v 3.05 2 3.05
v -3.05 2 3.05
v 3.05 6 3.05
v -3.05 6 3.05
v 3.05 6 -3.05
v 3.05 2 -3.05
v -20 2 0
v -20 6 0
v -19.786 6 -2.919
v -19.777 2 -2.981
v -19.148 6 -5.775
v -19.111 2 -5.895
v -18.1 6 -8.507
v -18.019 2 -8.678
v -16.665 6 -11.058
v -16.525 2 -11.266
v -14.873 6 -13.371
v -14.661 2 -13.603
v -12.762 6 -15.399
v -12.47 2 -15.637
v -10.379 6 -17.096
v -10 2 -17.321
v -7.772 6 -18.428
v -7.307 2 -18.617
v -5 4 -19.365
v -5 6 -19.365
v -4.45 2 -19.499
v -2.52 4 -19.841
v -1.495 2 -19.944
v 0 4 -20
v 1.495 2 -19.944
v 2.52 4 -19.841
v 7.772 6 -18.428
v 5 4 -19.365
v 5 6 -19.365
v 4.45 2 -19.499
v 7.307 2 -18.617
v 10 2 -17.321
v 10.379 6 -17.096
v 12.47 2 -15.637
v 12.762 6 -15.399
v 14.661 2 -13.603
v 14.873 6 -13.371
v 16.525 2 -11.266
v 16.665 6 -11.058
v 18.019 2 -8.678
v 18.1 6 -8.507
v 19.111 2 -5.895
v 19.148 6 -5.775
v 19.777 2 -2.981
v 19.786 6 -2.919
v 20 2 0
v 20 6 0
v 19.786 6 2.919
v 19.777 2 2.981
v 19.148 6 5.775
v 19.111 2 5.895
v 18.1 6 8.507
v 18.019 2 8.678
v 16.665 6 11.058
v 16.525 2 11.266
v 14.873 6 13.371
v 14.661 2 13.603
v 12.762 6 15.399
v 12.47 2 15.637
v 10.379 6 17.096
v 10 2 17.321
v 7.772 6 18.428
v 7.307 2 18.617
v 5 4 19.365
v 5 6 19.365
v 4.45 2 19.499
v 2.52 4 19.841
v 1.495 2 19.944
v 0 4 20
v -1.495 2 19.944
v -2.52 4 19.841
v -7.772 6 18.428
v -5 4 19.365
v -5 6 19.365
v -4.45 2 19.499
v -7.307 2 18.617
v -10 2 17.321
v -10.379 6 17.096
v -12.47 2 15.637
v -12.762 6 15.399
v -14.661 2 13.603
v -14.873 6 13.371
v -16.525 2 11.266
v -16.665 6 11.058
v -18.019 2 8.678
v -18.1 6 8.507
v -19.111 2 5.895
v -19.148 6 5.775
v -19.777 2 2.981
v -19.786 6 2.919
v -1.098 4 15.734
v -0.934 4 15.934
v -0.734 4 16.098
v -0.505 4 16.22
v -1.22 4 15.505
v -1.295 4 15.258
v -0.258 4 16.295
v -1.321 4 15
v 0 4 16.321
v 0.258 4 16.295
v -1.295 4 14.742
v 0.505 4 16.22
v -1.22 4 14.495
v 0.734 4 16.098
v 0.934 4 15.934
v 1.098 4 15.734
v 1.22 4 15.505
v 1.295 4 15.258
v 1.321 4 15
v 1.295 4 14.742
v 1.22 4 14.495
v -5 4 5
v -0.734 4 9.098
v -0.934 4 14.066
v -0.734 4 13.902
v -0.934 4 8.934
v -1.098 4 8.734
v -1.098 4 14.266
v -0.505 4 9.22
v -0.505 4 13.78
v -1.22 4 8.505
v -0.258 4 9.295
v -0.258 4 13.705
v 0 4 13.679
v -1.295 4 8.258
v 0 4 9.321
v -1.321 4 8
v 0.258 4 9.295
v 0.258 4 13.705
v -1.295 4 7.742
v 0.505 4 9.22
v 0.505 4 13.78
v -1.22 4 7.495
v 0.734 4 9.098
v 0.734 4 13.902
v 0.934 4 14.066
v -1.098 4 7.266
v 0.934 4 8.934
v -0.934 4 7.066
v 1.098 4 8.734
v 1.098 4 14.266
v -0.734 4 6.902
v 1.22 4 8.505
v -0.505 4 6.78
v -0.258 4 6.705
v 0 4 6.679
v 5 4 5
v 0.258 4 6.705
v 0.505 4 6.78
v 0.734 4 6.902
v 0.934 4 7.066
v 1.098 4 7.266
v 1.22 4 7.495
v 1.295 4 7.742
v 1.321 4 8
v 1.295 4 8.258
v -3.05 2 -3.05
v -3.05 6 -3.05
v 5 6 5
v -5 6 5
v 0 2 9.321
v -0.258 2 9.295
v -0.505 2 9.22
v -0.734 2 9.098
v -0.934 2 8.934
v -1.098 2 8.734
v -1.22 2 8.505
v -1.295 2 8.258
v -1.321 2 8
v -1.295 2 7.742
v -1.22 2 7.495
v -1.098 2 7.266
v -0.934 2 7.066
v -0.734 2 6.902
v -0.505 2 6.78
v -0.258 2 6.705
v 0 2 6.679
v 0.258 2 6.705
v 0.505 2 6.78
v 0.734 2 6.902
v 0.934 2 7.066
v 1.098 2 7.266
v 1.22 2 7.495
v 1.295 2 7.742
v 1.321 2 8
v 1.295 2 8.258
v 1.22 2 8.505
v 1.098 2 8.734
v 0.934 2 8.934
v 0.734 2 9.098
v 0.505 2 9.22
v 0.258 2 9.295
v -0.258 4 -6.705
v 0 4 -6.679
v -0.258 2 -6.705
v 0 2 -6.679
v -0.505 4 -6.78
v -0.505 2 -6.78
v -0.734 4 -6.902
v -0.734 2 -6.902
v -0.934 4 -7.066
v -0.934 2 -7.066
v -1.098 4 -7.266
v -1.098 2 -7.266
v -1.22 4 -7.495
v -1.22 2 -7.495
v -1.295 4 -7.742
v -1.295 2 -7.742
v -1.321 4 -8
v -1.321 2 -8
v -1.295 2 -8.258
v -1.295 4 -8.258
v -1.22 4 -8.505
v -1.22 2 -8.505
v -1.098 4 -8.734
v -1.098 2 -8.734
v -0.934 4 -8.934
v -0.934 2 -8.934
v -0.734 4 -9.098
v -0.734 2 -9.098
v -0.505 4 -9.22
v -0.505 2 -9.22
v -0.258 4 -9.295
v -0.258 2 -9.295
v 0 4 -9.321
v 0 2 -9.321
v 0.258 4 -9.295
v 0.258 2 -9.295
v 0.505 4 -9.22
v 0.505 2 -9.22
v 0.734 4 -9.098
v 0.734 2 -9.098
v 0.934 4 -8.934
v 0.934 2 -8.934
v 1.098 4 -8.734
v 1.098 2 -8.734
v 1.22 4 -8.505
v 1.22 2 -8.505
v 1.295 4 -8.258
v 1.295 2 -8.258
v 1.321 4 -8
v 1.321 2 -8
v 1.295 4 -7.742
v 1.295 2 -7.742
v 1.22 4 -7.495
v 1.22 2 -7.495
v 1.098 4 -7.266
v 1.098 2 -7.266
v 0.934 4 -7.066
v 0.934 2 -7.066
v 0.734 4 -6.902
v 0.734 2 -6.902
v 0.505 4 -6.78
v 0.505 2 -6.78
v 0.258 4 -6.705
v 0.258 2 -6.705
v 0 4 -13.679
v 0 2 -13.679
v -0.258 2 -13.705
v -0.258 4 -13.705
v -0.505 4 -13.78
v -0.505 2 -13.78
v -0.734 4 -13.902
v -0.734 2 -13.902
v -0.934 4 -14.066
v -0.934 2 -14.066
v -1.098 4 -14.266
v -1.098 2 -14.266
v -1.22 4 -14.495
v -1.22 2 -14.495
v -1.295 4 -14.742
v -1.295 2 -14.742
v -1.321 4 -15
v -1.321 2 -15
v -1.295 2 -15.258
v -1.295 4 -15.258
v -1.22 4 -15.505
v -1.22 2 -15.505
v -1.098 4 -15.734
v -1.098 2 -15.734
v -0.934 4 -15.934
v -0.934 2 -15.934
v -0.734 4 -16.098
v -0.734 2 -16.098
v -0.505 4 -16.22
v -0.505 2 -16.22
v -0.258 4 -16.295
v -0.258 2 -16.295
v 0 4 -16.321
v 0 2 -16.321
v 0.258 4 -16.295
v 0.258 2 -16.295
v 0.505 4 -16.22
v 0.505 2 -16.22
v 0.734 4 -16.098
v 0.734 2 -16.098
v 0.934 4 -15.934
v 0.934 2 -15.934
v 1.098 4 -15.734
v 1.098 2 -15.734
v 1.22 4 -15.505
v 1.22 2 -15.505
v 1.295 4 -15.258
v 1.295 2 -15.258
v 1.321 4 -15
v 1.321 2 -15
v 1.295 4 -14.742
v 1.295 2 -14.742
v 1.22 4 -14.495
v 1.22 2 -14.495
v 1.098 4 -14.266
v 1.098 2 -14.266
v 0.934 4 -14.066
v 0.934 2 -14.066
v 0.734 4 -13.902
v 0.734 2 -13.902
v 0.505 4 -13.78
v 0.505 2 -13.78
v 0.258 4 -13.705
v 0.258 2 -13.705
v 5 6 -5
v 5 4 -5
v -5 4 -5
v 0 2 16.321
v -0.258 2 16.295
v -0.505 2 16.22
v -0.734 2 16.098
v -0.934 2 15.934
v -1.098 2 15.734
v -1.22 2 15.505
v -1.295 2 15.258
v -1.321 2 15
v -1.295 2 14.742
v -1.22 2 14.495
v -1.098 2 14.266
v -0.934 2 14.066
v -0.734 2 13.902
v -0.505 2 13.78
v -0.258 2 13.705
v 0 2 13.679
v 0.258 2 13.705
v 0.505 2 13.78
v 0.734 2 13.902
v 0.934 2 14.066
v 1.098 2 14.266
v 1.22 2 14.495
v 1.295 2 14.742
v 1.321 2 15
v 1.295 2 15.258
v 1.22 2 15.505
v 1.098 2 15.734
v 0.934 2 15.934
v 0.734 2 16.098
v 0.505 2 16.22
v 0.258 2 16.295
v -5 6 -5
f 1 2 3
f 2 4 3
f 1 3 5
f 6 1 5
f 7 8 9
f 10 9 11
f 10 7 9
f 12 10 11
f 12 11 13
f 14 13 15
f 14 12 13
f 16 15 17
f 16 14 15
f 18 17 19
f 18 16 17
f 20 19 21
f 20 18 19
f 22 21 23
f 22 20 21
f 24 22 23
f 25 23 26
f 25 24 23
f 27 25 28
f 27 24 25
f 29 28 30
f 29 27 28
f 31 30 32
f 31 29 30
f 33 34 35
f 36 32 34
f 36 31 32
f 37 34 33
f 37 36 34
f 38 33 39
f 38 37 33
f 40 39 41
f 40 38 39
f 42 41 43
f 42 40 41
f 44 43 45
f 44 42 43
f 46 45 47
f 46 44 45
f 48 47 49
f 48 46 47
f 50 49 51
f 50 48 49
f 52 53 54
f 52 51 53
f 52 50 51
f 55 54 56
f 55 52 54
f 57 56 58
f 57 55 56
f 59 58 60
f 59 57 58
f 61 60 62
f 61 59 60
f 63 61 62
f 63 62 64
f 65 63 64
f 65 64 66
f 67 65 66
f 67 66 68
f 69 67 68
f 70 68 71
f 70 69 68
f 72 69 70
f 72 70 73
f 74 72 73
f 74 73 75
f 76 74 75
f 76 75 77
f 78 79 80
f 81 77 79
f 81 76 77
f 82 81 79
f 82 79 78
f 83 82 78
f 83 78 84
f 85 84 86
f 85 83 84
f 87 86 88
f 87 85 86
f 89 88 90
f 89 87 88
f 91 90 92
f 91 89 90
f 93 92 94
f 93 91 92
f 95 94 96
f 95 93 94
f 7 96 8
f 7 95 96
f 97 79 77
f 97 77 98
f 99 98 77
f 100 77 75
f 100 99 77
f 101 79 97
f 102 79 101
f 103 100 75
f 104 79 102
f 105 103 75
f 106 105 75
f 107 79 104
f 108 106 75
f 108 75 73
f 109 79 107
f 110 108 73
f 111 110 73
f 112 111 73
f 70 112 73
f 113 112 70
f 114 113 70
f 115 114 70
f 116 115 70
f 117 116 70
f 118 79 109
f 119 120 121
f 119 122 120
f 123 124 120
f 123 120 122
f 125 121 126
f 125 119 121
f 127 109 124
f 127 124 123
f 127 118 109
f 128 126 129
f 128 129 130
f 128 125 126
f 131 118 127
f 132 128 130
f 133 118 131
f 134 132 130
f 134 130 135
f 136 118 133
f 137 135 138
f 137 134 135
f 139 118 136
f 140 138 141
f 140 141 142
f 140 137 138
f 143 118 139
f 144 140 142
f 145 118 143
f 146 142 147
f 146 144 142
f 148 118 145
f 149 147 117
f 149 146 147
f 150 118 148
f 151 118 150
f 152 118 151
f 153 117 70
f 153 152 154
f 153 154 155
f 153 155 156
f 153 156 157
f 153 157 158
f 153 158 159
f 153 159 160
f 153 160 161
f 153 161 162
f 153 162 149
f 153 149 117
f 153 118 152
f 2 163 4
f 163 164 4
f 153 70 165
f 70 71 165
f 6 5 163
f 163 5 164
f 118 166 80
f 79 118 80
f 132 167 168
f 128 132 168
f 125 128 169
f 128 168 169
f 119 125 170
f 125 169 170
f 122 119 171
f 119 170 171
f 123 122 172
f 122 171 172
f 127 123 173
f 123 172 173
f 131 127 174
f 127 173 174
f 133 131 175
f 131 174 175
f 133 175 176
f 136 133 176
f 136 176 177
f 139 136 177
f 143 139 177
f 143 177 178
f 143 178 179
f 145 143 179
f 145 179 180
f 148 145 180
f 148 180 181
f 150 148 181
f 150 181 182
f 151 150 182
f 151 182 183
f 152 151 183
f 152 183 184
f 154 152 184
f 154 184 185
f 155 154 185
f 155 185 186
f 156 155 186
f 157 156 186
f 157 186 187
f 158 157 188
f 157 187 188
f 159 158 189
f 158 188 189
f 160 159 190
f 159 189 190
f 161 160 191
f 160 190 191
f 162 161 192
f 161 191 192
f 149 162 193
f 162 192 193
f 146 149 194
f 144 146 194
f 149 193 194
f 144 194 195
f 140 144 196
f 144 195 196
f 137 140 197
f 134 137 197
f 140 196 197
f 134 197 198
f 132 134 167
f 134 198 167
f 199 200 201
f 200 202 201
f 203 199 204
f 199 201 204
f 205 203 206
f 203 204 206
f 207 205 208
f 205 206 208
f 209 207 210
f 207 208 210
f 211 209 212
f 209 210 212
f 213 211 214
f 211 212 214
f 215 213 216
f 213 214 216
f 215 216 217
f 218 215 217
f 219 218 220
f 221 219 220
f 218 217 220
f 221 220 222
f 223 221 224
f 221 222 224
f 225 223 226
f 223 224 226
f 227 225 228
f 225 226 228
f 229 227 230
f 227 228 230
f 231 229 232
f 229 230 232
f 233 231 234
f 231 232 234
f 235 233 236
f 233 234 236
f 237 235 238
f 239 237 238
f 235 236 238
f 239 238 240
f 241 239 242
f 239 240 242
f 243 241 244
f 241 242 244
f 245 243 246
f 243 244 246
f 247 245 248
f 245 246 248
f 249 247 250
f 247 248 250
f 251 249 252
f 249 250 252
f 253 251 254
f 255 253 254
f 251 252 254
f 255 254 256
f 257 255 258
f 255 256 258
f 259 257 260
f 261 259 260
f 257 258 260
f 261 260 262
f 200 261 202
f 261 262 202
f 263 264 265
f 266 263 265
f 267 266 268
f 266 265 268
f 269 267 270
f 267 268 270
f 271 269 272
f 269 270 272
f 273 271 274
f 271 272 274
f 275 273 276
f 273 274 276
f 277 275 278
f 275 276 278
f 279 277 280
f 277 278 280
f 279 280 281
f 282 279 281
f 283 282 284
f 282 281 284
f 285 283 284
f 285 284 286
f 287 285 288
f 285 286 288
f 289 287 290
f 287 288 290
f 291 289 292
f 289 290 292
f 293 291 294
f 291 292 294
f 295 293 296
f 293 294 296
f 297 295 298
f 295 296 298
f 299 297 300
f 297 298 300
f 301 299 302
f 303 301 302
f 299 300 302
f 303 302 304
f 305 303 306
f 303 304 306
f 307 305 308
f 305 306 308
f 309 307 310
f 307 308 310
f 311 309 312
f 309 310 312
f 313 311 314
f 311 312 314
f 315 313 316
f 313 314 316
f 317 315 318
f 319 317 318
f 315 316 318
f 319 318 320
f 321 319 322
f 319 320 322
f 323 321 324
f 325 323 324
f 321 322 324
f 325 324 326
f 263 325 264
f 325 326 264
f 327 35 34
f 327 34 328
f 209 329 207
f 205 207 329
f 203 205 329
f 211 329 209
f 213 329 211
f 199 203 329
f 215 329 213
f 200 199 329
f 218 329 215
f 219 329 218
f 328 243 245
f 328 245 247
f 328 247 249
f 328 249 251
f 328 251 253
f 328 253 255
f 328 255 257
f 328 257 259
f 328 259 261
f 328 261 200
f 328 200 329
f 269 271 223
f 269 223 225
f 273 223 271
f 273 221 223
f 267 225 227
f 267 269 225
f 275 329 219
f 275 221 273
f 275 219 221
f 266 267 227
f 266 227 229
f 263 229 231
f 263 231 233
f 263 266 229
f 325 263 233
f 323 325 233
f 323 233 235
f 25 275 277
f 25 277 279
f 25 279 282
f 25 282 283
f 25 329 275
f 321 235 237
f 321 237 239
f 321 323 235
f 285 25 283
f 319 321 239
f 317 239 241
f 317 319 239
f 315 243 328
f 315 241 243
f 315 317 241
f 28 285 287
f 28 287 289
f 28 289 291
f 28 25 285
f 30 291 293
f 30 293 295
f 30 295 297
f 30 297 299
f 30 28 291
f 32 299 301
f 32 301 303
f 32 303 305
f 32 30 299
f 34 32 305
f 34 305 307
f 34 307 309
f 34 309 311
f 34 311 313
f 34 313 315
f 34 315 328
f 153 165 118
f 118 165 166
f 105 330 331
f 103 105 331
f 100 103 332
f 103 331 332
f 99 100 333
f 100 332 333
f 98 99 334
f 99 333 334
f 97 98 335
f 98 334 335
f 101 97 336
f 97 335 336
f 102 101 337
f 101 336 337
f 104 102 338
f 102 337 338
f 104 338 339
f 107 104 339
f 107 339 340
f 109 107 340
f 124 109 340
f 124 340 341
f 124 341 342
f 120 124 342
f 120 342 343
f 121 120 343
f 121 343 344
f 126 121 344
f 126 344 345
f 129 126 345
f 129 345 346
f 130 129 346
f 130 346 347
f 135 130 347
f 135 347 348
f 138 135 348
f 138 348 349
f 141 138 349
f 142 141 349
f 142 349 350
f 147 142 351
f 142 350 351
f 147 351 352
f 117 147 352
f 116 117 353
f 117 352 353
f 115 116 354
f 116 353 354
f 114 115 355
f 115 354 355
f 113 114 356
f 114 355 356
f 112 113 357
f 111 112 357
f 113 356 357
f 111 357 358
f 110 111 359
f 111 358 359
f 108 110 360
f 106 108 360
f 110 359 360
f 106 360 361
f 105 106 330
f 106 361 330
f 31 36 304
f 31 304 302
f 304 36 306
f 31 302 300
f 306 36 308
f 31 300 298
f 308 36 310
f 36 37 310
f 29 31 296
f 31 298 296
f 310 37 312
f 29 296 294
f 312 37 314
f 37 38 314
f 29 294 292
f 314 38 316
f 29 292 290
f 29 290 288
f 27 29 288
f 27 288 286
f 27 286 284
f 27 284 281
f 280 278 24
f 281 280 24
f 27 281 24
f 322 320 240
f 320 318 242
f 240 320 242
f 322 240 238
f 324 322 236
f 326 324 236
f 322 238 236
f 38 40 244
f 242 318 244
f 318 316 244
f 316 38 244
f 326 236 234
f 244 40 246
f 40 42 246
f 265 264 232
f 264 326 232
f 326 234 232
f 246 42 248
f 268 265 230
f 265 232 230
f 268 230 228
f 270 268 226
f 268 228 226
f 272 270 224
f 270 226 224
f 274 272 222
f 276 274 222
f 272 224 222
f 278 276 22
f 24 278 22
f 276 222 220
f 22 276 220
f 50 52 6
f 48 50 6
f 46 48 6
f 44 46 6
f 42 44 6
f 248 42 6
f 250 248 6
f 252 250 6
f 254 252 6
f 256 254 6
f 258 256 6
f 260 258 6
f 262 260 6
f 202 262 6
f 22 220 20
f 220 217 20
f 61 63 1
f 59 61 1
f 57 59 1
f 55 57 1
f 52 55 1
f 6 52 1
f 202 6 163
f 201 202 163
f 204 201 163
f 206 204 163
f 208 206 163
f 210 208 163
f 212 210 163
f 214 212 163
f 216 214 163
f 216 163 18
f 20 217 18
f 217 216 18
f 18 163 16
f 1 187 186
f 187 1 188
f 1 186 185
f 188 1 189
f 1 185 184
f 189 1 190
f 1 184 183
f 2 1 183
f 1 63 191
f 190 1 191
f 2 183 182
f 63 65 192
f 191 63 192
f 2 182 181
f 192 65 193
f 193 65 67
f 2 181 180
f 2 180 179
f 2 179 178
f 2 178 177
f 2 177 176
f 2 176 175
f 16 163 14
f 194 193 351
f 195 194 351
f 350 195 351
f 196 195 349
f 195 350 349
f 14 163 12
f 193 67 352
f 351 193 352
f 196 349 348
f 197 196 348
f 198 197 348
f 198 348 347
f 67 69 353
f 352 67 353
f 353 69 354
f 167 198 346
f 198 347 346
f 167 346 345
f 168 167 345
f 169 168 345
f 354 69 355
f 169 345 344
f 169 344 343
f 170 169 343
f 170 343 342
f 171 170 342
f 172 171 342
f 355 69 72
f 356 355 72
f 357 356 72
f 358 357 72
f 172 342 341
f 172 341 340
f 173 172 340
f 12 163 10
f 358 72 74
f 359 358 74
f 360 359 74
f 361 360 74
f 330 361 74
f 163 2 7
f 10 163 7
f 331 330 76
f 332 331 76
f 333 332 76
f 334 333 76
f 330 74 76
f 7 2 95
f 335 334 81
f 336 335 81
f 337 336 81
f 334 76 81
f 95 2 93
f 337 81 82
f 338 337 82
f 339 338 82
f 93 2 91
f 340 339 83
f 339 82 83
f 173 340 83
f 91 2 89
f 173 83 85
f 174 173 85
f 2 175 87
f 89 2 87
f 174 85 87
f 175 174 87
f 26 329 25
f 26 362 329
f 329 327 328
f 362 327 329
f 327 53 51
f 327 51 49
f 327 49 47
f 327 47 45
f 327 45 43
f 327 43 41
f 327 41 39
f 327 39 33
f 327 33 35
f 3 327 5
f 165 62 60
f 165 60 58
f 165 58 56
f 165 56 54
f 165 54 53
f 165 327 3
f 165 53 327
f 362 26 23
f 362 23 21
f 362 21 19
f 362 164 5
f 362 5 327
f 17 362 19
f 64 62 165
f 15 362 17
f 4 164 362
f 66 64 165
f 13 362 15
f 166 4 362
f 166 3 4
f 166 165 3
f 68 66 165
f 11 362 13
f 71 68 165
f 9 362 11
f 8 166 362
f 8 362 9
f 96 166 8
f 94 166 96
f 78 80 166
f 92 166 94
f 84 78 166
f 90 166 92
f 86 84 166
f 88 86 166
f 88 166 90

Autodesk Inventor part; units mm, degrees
ref_plane "YZ Plane" through (0, 0, 0) normal (1, 0, 0) x (0, 1, 0)
ref_plane "XZ Plane" through (0, 0, 0) normal (0, 1, 0) x (-1, 0, 0)
sketch "Sketch1" plane through (0, 0, 0) normal (0, 1, 0) x (-1, 0, 0)
  circle A0 centre (0, 0) radius 20
  dimension "d0" = 40
extrude "Extrusion1" add sketch "Sketch1" along normal blind 6
sketch "Sketch3" plane through (0, 6, 0) normal (0, 1, 0) x (1, 0, 0)
  line L0 (0, 0) -> (0, 20)
  circle A0 centre (0, 0) radius 20 projected
  line L1 (5, 35) -> (5, 5)
  line L2 (5, 5) -> (-5, 5)
  line L3 (-5, 5) -> (-5, 35)
  line L4 (-5, 35) -> (5, 35)
  line L5 (5, 35) -> (-5, 5) construction
  line L6 (5, 5) -> (-5, 35) construction
  line L7 (20, 0) -> (-20, 0) construction
  line L8 (5, -35) -> (5, -5)
  line L9 (5, -5) -> (-5, -5)
  line L10 (-5, -5) -> (-5, -35)
  line L11 (-5, -35) -> (5, -35)
  point P0 (-5, 19.3649)
  point P1 (5, 19.3649)
  point P2 (-5, -19.3649)
  point P3 (5, -19.3649)
  dimension "d11" = 30
  dimension "d12" = 10
extrude "Extrusion2" cut sketch "Sketch3" against normal blind 2 contours L2 L3 A0 L0 | L0 A0 L1 L2 | L10 L9 L8 A0
sketch "Sketch5" plane through (0, 4, 0) normal (0, 1, 0) x (1, 0, 0)
  circle A0 centre (0, -8) radius 1
  circle A1 centre (0, -15) radius 1
  line L0 (-5, -5) -> (5, -5) projected
  arc A2 (-5, 19.3649) -> (-5, -19.3649) centre (0, 0) ccw projected
  line L1 (-20, 0) -> (20, 0) construction
  arc A3 (5, -19.3649) -> (5, 19.3649) centre (0, 0) ccw projected
  circle A4 centre (0, 8) radius 1
  circle A5 centre (0, 15) radius 1
  line L2 (-28, 0) -> (28, 0) projected
  line L3 (-5, 5) -> (-5, 19.3649) projected
  dimension "d20" = 2
  dimension "d21" = 2
  dimension "d42" = 8
  dimension "d43" = 7
  dimension "d44" = 8
  dimension "d45" = 20
  dimension "d47" = 5
hole "Hole2" at (0, 4, 15) at (0, 4, 8) at (0, 4, -8) at (0, 4, -15) direction (0, -1, 0) diameter 2.6416 depth 10.979 tip angle 118 thread size "6-32 UNC" class "2B" standard "ANSI Unified Screw Threads"
sketch "Sketch6" plane through (0, 6, 0) normal (0, 1, 0) x (1, 0, 0)
  line L0 (3.05, 3.05) -> (-3.05, 3.05)
  line L1 (-3.05, 3.05) -> (-3.05, -3.05)
  line L2 (-3.05, -3.05) -> (3.05, -3.05)
  line L3 (3.05, -3.05) -> (3.05, 3.05)
  point P0 (0, 0)
  dimension "d31" = 6.1
  dimension "d32" = 6.1
  dimension "d33" = 3.05
  dimension "d34" = 3.05
extrude "Extrusion4" cut sketch "Sketch6" against normal blind 10
ref_plane "Work Plane1" through (0, 0, 20) normal (0, 0, 1) x (1, 0, 0)
sketch "Sketch7" plane through (0, 0, 20) normal (0, 0, 1) x (1, 0, 0)
  line L0 (20, 0) -> (-20, 0) projected
  line L1 (-20, 0) -> (20, 0)
  line L2 (20, 0) -> (20, 2)
  line L3 (20, 2) -> (-20, 2)
  line L4 (-20, 2) -> (-20, 0)
  point P0 (0, 0)
  dimension "d38" = 40
  dimension "d39" = 2
extrude "Extrusion5" cut sketch "Sketch7" against normal blind 40
sketch "Sketch8" plane through (0, 6, 0) normal (0, 1, 0) x (1, 0, 0)
  line L0 (-20, -20) -> (-7, -20)
  line L1 (-7, -20) -> (-7, 20)
  line L2 (-7, 20) -> (-20, 20)
  line L3 (-20, 20) -> (-20, -20)
  line L4 (7, -20) -> (20, -20)
  line L5 (20, -20) -> (20, 20)
  line L6 (20, 20) -> (7, 20)
  line L7 (7, 20) -> (7, -20)
  line L8 (5, 19.3649) -> (5, 5) projected
  line L9 (-5, 5) -> (-5, 19.3649) projected
  line L10 (28.233, -20) -> (-28.0388, -20) projected
  point P0 (0, 0)
  dimension "d48" = 40
  dimension "d49" = 0
  dimension "d50" = 0
  dimension "d51" = 2
  dimension "d52" = 2
  dimension "d53" = 0
  dimension "d54" = 13
  dimension "d55" = 13
properties part number "prop_base"
